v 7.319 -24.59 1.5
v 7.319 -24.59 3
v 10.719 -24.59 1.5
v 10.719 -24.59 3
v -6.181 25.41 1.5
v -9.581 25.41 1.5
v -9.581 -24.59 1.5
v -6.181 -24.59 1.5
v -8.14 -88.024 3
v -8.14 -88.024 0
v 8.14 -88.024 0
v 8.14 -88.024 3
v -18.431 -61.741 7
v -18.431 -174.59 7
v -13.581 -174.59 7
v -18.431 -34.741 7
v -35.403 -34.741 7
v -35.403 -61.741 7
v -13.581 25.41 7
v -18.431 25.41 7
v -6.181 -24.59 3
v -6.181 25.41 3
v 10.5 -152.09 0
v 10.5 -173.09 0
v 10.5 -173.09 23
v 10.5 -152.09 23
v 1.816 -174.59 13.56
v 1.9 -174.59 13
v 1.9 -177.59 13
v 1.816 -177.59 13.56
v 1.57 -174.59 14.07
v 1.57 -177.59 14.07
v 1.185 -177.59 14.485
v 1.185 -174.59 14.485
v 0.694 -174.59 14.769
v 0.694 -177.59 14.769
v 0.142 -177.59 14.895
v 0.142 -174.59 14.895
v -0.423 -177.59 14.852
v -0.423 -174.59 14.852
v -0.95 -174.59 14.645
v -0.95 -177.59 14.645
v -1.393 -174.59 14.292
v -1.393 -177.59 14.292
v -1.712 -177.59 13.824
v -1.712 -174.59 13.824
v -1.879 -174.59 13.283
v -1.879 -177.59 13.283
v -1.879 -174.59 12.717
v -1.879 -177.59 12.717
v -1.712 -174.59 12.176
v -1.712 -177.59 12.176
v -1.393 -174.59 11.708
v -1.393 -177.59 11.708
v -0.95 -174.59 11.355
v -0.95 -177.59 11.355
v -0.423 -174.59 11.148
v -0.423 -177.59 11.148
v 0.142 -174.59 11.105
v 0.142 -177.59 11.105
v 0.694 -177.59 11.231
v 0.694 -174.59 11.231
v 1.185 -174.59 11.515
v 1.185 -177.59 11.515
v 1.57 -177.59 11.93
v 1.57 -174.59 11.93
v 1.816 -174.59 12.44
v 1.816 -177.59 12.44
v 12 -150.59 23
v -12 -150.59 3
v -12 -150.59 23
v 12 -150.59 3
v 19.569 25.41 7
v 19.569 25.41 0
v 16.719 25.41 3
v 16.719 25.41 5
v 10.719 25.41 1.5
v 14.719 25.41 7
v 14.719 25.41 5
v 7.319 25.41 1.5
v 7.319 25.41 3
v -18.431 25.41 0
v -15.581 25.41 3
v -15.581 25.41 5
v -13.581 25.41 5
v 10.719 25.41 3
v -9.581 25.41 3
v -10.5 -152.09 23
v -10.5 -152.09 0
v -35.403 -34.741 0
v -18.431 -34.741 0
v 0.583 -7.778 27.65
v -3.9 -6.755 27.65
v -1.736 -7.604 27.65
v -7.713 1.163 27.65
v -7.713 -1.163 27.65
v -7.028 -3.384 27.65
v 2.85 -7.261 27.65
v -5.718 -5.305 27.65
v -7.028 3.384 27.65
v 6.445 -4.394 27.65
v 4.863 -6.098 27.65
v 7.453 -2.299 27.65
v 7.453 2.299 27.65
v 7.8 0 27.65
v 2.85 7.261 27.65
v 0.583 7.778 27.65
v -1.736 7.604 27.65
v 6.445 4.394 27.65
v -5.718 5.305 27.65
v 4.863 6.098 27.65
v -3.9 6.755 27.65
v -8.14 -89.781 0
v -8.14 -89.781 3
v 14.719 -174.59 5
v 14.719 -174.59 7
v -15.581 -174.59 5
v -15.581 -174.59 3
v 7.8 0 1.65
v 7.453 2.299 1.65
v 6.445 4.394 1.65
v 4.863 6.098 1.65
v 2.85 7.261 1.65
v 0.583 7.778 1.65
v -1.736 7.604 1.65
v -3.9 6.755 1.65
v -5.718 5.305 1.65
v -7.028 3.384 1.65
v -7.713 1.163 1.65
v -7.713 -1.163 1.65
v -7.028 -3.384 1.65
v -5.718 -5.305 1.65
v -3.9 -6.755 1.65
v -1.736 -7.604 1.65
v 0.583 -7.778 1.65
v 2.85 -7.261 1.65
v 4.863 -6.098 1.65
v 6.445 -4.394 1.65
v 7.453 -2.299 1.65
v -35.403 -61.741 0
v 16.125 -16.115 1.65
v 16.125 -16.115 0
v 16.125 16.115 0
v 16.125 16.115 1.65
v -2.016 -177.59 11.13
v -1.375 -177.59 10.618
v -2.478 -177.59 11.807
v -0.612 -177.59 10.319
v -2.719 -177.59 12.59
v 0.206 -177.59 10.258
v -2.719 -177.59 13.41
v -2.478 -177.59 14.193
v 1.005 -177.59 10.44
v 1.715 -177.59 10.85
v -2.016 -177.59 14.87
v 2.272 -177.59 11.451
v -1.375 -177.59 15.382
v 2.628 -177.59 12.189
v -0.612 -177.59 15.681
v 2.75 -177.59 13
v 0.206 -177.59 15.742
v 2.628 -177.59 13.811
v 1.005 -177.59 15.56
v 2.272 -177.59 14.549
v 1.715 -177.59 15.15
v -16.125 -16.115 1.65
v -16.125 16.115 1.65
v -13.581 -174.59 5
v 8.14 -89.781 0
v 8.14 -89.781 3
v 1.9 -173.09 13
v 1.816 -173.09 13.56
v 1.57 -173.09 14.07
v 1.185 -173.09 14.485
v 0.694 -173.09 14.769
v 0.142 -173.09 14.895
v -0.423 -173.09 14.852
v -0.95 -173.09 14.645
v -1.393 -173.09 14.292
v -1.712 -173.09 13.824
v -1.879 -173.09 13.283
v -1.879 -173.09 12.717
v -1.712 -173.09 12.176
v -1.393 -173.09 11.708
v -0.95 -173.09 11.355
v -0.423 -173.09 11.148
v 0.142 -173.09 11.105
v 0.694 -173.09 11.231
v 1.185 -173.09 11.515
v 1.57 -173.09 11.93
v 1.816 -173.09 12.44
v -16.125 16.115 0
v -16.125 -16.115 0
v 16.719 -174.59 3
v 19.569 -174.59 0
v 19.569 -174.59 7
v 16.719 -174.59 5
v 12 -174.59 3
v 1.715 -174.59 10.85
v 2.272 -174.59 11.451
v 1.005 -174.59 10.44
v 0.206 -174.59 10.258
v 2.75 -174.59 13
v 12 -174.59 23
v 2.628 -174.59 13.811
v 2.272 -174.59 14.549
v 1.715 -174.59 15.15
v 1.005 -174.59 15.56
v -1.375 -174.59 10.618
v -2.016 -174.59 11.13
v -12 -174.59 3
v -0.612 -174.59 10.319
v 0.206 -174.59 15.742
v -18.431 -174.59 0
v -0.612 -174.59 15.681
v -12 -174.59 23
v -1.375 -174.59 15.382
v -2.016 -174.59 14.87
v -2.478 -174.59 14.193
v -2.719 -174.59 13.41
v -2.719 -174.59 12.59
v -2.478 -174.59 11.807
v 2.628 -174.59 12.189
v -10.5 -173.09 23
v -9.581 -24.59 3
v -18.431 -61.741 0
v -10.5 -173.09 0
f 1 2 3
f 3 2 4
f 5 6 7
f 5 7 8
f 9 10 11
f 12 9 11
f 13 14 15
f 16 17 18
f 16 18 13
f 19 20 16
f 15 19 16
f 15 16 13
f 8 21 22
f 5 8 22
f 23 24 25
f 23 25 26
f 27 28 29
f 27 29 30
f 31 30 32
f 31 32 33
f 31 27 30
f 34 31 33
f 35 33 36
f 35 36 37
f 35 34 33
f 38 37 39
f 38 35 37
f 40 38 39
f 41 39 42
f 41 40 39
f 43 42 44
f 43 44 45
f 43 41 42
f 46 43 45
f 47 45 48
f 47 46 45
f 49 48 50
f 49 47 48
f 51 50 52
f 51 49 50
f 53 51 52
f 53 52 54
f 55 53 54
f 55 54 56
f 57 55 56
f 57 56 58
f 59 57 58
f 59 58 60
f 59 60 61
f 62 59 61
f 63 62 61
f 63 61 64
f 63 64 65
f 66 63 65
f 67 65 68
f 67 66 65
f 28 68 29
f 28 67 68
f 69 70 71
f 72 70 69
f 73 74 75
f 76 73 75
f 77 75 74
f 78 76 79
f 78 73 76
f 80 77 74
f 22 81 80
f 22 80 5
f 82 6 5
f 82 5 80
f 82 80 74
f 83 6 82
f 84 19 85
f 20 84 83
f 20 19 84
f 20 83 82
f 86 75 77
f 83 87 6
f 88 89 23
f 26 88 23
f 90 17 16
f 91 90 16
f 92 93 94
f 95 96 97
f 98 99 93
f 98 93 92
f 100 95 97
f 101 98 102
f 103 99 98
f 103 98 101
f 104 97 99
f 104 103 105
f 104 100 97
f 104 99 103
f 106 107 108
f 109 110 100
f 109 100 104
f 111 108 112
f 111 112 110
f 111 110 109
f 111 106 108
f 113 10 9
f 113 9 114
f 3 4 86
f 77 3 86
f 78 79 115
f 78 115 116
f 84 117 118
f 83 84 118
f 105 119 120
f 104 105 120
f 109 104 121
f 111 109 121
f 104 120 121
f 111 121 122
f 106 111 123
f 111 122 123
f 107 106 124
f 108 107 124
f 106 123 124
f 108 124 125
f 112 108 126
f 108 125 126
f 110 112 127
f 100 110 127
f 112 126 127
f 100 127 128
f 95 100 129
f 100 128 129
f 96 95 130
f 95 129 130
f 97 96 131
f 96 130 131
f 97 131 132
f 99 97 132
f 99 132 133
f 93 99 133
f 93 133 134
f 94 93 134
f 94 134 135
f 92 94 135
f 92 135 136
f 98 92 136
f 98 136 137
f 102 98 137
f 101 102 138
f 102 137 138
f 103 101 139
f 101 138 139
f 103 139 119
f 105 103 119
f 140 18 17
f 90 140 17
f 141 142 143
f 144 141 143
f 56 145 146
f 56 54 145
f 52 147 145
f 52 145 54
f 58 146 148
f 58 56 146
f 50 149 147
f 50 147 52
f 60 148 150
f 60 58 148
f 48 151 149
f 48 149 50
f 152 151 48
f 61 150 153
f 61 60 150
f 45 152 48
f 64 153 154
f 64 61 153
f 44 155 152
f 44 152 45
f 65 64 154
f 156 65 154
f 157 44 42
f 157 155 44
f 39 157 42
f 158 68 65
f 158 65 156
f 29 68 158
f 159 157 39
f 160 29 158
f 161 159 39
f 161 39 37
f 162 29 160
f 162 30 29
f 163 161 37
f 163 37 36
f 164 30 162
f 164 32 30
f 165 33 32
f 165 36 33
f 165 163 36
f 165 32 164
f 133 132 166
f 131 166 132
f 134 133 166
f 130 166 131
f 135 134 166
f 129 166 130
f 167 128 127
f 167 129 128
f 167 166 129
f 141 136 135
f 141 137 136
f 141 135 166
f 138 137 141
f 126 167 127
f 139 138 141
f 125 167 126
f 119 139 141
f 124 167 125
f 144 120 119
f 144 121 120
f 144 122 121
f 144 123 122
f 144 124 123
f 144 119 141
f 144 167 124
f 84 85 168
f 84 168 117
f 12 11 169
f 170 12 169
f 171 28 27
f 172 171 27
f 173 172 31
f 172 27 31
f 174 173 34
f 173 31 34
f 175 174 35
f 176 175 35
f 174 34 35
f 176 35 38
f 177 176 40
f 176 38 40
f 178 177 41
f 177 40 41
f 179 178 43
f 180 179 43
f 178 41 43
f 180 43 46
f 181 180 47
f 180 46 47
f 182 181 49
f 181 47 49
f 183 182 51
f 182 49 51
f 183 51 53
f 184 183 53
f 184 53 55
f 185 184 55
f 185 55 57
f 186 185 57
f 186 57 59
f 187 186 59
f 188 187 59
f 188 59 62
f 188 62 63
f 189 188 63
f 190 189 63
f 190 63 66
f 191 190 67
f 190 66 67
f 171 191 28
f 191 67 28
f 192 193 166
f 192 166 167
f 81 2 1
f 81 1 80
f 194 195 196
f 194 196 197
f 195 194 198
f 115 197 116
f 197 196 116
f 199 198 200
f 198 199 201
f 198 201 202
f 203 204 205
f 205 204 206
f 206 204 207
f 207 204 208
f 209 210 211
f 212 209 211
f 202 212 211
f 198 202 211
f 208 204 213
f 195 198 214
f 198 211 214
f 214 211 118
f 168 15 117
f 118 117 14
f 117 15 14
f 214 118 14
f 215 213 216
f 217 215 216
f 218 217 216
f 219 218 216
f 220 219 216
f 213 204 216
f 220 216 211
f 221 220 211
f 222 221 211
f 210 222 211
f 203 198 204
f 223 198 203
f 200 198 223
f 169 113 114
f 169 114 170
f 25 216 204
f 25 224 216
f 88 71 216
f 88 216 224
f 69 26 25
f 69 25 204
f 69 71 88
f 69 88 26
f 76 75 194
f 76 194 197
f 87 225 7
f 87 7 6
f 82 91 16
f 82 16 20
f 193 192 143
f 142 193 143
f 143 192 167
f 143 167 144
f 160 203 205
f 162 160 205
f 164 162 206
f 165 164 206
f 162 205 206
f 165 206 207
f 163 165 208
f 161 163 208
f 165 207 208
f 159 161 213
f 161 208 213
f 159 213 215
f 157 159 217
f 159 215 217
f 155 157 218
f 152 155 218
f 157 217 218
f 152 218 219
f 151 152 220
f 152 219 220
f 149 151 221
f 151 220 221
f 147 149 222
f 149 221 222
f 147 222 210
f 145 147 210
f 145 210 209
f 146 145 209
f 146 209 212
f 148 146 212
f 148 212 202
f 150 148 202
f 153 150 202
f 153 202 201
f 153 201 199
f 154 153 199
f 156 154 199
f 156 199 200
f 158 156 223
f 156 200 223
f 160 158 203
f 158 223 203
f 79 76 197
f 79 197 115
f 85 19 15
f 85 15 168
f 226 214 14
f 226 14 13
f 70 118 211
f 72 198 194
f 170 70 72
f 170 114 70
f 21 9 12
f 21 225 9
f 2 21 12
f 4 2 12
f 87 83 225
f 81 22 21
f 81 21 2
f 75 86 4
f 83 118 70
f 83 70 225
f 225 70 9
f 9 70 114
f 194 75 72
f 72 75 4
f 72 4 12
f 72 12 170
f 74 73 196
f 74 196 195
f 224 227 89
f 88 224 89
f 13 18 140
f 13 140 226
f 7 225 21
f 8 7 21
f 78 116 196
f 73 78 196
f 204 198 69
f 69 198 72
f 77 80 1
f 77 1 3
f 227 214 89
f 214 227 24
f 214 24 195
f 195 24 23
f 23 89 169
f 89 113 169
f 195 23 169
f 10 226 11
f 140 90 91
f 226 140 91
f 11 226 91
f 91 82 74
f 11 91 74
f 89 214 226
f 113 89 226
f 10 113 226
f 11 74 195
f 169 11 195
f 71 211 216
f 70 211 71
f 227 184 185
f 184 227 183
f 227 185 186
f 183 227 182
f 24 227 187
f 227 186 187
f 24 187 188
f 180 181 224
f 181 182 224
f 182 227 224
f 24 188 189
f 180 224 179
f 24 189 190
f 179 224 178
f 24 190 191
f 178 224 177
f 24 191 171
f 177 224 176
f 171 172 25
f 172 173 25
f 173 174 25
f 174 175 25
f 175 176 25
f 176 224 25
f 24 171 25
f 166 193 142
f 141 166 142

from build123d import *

# Parameters (mm, degrees)
F0_W           = 32.25
F0_H           = 32.23
F1_DEPTH       = 1.65
F2_R           = 7.8
F3_DEPTH       = 26
F4_W           = 38
F4_H           = 200
F5_DEPTH       = 3
F7_DEPTH       = 200
F8_W           = 24
F8_H           = 24
F8_W_2         = 21
F8_H_2         = 21
F9_DEPTH       = 20
F10_W          = 17
F10_H          = 27
F11_DEPTH      = 4
F11_DEPTH_BACK = 3
F12_W          = 16.2802226841
F12_H          = 1.756504178
F13_DEPTH      = 3
F14_W          = 3.4
F14_H          = 50
F15_DEPTH      = 1.5
F16_DEPTH      = 3
F17_R          = 2.75
F17_R_2        = 1.9
F18_DEPTH      = 3
F19_DEPTH      = 1.5


with BuildPart() as f1:
    # F0 (on Top) → F1 (new body)
    with BuildSketch(Plane.XY):
        Rectangle(F0_W, F0_H)
    extrude(amount=F1_DEPTH)

    # F2 (on face) → F3 (join)
    with BuildSketch(Plane.XY.offset(1.65)):
        Circle(F2_R)
    extrude(amount=F3_DEPTH)


with BuildPart() as f5:
    # F4 (on Top) → F5 (new body)
    with BuildSketch(Plane.XY):
        with Locations((0.5689565417, -74.5901823044)):
            Rectangle(F4_W, F4_H)
    extrude(amount=F5_DEPTH)

    # F6 (on face) → F7 (join, through all)
    with BuildSketch(Plane(origin=(0, 25.4098176956, 0), x_dir=(-1, 0, 0), z_dir=(0, 1, 0))):
        Polygon((-19.5689565417, 3), (-16.7189565417, 3), (-16.7189565417, 5), (-14.7189565417, 5), (-14.7189565417, 7), (-19.5689565417, 7), align=None)
        Polygon((15.5810434583, 5), (15.5810434583, 3), (18.4310434583, 3), (18.4310434583, 7), (13.5810434583, 7), (13.5810434583, 5), align=None)
    extrude(amount=-F7_DEPTH)

    # F8 (on face) → F9 (join)
    with BuildSketch(Plane.XY.offset(3)):
        with Locations((0, -162.5901823044)):
            Rectangle(F8_W, F8_H)
        with Locations((0, -162.5901823044)):
            Rectangle(F8_W_2, F8_H_2, mode=Mode.SUBTRACT)
    extrude(amount=F9_DEPTH)

    # F10 (on face) → F11 (join, two sides)
    with BuildSketch(Plane.XY.offset(3)) as f11_sk:
        with Locations((-26.9029508382, -48.2411993444)):
            Rectangle(F10_W, F10_H)
    extrude(amount=F11_DEPTH)
    extrude(f11_sk.sketch, amount=-F11_DEPTH_BACK)

    # F12 (on face) → F13 (cut, through all)
    with BuildSketch(Plane(origin=(0, 0, 0), x_dir=(1, 0, 0), z_dir=(0, 0, -1))):
        with Locations((0, 88.90273422)):
            Rectangle(F12_W, F12_H)
    extrude(amount=-F13_DEPTH, mode=Mode.SUBTRACT)

    # F14 (on face) → F15 (cut)
    with BuildSketch(Plane.XY.offset(3)):
        with Locations((-7.8810434583, 0.4098176956)):
            Rectangle(F14_W, F14_H)
        with Locations((9.0189565417, 0.4098176956)):
            Rectangle(F14_W, F14_H)
    extrude(amount=-F15_DEPTH, mode=Mode.SUBTRACT)

    # F16 (cut, through all): a face of the model
    f16_faces = [f5.faces().sort_by_distance(p)[0] for p in [
        (0, -162.5901823044, 3),
    ]]
    extrude(f16_faces, amount=-F16_DEPTH, mode=Mode.SUBTRACT)

    # F17 (on face) → F18 (join)
    with BuildSketch(Plane.XZ.offset(174.5901823044)):
        with Locations((0, 13)):
            Circle(F17_R)
        with Locations((0, 13)):
            Circle(F17_R_2, mode=Mode.SUBTRACT)
    extrude(amount=F18_DEPTH)

    # F19 (cut, through all): a face of the model
    f19_faces = [f5.faces().sort_by_distance(p)[0] for p in [
        (0, -174.5901823044, 13),
    ]]
    extrude(f19_faces, amount=-F19_DEPTH, mode=Mode.SUBTRACT)


solid = Compound([f1.part, f5.part])
